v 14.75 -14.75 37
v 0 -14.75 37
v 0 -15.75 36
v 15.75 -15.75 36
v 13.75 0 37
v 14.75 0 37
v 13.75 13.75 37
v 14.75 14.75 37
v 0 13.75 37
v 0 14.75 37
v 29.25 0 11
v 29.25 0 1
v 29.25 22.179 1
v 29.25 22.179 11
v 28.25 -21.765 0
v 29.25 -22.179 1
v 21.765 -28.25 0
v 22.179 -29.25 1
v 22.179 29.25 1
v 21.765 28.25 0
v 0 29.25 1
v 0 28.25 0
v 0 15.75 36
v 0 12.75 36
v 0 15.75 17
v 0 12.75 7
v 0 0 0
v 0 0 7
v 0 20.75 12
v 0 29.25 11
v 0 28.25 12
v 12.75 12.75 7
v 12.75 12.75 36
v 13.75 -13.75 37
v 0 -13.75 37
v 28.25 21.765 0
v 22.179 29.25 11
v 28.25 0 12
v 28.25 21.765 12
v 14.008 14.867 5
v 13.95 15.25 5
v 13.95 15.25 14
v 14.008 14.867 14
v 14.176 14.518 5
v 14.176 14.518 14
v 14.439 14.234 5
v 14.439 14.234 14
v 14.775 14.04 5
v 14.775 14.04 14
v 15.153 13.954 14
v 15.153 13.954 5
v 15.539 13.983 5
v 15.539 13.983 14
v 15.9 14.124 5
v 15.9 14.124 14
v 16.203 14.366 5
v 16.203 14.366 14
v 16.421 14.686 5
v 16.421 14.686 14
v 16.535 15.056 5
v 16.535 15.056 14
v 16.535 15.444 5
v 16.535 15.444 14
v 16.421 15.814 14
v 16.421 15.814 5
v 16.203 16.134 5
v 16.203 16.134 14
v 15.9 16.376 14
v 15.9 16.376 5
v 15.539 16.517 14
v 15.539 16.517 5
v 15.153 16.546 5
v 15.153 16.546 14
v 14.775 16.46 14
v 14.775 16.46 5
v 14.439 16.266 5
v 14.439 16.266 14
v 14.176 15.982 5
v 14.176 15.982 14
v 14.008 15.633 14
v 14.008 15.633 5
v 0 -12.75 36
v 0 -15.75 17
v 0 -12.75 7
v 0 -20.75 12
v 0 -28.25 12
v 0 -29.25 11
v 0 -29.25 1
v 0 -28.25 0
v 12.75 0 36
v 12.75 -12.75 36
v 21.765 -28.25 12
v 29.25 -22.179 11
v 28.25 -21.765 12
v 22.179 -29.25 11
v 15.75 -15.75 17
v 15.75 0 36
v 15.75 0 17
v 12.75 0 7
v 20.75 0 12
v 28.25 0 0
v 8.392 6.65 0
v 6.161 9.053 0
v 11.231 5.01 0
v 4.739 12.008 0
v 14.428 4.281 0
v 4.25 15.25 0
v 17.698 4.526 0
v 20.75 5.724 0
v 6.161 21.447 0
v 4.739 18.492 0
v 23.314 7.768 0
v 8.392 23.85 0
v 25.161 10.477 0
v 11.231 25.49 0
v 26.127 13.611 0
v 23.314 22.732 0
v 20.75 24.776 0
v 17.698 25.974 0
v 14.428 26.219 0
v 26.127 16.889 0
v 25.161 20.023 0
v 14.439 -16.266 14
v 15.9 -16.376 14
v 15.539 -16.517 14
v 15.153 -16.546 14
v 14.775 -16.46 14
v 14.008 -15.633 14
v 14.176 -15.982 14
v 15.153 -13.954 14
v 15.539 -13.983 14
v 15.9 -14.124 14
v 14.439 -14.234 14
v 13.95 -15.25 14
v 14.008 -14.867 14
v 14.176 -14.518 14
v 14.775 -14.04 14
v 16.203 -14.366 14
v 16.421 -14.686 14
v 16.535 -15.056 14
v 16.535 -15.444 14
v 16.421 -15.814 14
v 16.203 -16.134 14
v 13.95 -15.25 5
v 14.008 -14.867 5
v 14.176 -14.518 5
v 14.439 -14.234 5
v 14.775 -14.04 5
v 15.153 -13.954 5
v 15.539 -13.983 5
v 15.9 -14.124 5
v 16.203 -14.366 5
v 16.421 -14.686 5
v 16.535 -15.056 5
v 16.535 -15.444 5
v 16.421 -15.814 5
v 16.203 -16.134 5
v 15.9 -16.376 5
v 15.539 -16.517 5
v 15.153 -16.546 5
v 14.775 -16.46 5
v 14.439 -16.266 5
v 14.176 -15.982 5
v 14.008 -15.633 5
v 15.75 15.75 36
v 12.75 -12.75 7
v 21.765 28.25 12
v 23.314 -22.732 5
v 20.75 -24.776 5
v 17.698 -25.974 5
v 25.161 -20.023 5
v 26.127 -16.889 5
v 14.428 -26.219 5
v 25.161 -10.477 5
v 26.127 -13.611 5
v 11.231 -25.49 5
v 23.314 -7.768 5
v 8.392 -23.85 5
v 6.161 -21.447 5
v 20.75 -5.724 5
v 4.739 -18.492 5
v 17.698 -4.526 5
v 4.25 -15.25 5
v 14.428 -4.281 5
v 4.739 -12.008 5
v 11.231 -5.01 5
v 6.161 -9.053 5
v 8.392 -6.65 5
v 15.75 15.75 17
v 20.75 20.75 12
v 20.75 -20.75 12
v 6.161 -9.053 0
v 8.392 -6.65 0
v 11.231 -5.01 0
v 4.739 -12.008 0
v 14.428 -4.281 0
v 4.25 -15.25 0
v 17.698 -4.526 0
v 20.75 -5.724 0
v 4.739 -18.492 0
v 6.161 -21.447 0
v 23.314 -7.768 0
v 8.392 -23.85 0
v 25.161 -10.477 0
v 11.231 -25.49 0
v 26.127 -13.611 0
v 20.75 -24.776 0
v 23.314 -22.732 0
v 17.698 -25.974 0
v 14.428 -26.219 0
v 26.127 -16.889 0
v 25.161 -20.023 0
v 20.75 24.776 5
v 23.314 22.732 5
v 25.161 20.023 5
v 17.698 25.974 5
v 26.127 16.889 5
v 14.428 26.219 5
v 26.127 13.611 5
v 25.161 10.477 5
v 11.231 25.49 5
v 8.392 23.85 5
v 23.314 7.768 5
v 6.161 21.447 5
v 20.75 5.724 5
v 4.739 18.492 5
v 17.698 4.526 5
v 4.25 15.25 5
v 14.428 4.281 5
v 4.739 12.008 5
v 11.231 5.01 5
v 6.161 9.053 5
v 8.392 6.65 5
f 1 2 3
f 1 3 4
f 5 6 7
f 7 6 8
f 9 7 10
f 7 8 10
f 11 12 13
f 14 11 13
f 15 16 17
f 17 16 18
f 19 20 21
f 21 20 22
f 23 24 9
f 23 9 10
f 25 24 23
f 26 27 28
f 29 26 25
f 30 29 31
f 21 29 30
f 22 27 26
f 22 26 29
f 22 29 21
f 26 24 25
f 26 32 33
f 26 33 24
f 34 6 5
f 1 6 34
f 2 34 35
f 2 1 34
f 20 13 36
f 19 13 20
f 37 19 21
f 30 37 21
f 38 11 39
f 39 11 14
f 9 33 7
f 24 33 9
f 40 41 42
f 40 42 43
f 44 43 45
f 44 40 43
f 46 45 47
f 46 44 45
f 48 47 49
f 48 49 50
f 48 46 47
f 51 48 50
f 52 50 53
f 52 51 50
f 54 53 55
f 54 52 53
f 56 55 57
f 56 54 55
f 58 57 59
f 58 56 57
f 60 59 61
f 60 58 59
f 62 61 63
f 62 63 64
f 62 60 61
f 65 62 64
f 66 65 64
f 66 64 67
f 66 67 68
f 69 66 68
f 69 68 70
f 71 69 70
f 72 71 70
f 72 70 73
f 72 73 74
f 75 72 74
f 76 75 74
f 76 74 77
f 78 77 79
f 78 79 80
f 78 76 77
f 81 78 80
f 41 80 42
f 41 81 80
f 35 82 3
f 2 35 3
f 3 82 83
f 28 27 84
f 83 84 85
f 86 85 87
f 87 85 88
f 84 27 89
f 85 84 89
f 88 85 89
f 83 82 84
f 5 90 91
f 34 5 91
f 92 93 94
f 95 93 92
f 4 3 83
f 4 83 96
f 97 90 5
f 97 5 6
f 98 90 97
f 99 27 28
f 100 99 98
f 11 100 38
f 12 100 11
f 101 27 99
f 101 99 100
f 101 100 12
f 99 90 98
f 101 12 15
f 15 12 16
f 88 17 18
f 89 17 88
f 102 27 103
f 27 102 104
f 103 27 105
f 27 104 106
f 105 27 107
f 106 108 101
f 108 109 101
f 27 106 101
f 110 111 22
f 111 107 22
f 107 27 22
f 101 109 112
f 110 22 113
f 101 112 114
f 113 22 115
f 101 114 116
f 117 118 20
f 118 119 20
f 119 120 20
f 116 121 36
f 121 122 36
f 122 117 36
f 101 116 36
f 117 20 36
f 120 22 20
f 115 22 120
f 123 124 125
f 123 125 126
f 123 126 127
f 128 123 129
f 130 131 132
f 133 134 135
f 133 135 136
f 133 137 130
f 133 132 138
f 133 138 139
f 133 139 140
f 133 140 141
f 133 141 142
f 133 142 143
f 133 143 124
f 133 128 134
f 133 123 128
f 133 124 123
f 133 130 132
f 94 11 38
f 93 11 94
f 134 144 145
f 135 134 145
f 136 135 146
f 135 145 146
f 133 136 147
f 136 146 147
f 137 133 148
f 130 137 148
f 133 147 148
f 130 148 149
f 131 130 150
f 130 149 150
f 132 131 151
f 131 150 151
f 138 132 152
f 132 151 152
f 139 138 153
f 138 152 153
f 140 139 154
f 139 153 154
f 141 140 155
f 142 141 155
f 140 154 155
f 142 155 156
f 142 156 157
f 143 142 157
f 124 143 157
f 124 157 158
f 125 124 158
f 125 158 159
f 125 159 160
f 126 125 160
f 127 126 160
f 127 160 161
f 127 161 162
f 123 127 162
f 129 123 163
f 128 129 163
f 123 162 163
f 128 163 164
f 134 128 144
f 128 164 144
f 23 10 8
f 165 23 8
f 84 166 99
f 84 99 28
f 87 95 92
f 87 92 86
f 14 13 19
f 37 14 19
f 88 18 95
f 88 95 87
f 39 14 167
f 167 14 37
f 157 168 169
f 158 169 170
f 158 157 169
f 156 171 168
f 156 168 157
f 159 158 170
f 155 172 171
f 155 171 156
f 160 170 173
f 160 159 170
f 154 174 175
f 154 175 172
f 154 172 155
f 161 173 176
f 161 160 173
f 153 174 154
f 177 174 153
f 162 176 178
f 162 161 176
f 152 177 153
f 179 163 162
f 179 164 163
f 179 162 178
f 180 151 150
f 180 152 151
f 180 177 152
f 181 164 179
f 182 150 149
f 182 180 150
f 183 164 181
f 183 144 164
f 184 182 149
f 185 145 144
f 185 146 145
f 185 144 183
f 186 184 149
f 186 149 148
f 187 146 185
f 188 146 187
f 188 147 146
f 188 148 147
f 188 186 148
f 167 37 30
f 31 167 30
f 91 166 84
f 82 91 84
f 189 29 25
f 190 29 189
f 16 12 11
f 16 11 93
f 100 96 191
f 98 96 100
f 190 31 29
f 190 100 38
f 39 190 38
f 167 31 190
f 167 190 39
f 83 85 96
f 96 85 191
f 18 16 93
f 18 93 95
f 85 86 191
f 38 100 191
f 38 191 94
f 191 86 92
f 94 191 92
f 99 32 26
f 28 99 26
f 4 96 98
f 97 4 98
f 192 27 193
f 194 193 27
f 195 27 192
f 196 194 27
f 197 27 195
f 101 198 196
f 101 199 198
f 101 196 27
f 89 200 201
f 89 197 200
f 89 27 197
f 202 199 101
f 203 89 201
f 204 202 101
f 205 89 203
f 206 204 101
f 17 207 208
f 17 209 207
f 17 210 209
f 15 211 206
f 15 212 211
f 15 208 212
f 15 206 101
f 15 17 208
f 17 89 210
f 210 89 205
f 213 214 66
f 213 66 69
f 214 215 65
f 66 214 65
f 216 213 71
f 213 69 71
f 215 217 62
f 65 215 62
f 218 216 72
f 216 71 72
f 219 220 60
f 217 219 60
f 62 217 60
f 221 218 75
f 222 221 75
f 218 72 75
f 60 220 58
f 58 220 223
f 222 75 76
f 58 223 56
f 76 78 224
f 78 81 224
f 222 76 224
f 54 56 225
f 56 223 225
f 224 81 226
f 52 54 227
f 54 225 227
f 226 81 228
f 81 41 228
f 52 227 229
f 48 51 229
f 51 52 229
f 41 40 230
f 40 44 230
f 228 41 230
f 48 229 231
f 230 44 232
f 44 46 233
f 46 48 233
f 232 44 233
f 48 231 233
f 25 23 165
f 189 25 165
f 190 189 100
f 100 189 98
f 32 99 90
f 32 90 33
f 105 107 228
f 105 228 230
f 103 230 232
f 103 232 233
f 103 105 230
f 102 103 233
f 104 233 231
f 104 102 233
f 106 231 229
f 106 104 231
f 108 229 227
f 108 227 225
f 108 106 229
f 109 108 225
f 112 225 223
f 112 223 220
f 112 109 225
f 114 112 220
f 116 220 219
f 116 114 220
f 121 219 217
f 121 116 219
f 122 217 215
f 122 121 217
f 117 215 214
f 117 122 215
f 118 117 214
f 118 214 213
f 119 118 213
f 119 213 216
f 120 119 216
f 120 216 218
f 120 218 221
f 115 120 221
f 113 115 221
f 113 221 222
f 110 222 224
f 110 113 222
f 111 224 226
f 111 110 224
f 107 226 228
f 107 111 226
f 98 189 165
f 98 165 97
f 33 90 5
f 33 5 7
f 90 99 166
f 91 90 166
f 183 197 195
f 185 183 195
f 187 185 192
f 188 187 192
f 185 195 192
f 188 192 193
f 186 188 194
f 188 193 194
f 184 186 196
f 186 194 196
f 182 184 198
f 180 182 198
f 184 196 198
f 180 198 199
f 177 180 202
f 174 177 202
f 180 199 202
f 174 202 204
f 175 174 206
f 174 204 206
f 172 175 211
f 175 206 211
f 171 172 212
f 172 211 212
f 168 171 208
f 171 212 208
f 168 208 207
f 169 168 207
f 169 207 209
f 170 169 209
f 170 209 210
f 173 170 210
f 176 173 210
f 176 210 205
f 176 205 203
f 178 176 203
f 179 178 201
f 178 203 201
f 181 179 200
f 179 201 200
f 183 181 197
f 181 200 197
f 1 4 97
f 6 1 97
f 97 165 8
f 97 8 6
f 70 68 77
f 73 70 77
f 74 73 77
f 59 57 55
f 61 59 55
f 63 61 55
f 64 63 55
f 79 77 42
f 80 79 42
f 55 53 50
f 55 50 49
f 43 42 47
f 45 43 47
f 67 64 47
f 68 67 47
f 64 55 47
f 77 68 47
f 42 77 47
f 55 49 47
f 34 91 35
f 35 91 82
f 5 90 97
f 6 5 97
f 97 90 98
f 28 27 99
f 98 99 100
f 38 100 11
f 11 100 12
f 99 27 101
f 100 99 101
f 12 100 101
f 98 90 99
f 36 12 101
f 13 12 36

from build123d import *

# Parameters (mm, degrees)
PAD_DEPTH       = 12
SKETCH001_W     = 12.75
SKETCH001_H     = 12.75
POCKET_DEPTH    = 5
PAD001_DEPTH    = 25
SKETCH003_R     = 11
POCKET001_DEPTH = 5
CHAMFER_SIZE    = 5
SKETCH004_R     = 1.3
POCKET002_DEPTH = 9
CHAMFER001_SIZE = 1
CHAMFER002_SIZE = 1


with BuildPart() as k_rper:
    # Sketch → Pad (new body)
    with BuildSketch(Plane.XY):
        Polygon((0, 0), (-29.25, 0), (-29.25, 22.178932), (-22.178932, 29.25), (0, 29.25), align=None)
    extrude(amount=PAD_DEPTH)

    # Sketch001 (on Face7 of Pad) → Pocket (cut)
    with BuildSketch(Plane.XY.offset(12)):
        with Locations((-6.375, 6.375)):
            Rectangle(SKETCH001_W, SKETCH001_H)
    extrude(amount=-POCKET_DEPTH, mode=Mode.SUBTRACT)

    # Sketch002 (on Face4 of Pocket) → Pad001 (join)
    with BuildSketch(Plane.XY.offset(12)):
        Polygon((0, 12.75), (0, 15.75), (-15.75, 15.75), (-15.75, 0), (-12.75, 0), (-12.75, 12.75), align=None)
    extrude(amount=PAD001_DEPTH)

    # Sketch003 (on Face2 of Pad001) → Pocket001 (cut)
    with BuildSketch(Plane(origin=(0, 0, 0), x_dir=(1, 0, 0), z_dir=(0, 0, -1))):
        with Locations((-15.25, -15.25)):
            Circle(SKETCH003_R)
    extrude(amount=-POCKET001_DEPTH, mode=Mode.SUBTRACT)

    # Chamfer
    chamfer_edges = [k_rper.edges().sort_by_distance(p)[0] for p in [
        (-7.875, 15.75, 12),
        (-15.75, 7.875, 12),
    ]]
    chamfer(chamfer_edges, length=CHAMFER_SIZE)

    # Sketch004 (on Face18 of Pocket001) → Pocket002 (cut)
    with BuildSketch(Plane(origin=(0, 0, 5), x_dir=(1, 0, 0), z_dir=(0, 0, -1))):
        with Locations((-15.25, -15.25)):
            Circle(SKETCH004_R)
    extrude(amount=-POCKET002_DEPTH, mode=Mode.SUBTRACT)

    # Chamfer001
    chamfer001_edges = [k_rper.edges().sort_by_distance(p)[0] for p in [
        (-7.875, 15.75, 37),
        (-15.75, 7.875, 37),
        (-6.375, 12.75, 37),
        (-12.75, 6.375, 37),
    ]]
    chamfer(chamfer001_edges, length=CHAMFER001_SIZE)

    # Chamfer002
    chamfer002_edges = [k_rper.edges().sort_by_distance(p)[0] for p in [
        (-11.089466, 29.25, 12),
        (-25.714466, 25.714466, 12),
        (-29.25, 11.089466, 12),
        (-29.25, 11.089466, 0),
        (-25.714466, 25.714466, 0),
        (-11.089466, 29.25, 0),
    ]]
    chamfer(chamfer002_edges, length=CHAMFER002_SIZE)


with BuildPart() as part_mirroring001:
    # Part__Mirroring001: instance of Körper
    add(k_rper.part.mirror(Plane(origin=(0, 0, 0), x_dir=(0, -1, 0), z_dir=(1, 0, 0))))


with BuildPart() as part_mirroring:
    # Part__Mirroring: instance of Körper
    add(k_rper.part.mirror(Plane(origin=(0, 0, 0), x_dir=(1, 0, 0), z_dir=(0, 1, 0))))


with BuildPart() as part_mirroring002:
    # Part__Mirroring002: instance of Part__Mirroring
    add(part_mirroring.part.mirror(Plane(origin=(0, 0, 0), x_dir=(0, -1, 0), z_dir=(1, 0, 0))))


solid = Compound([part_mirroring001.part, part_mirroring002.part])
